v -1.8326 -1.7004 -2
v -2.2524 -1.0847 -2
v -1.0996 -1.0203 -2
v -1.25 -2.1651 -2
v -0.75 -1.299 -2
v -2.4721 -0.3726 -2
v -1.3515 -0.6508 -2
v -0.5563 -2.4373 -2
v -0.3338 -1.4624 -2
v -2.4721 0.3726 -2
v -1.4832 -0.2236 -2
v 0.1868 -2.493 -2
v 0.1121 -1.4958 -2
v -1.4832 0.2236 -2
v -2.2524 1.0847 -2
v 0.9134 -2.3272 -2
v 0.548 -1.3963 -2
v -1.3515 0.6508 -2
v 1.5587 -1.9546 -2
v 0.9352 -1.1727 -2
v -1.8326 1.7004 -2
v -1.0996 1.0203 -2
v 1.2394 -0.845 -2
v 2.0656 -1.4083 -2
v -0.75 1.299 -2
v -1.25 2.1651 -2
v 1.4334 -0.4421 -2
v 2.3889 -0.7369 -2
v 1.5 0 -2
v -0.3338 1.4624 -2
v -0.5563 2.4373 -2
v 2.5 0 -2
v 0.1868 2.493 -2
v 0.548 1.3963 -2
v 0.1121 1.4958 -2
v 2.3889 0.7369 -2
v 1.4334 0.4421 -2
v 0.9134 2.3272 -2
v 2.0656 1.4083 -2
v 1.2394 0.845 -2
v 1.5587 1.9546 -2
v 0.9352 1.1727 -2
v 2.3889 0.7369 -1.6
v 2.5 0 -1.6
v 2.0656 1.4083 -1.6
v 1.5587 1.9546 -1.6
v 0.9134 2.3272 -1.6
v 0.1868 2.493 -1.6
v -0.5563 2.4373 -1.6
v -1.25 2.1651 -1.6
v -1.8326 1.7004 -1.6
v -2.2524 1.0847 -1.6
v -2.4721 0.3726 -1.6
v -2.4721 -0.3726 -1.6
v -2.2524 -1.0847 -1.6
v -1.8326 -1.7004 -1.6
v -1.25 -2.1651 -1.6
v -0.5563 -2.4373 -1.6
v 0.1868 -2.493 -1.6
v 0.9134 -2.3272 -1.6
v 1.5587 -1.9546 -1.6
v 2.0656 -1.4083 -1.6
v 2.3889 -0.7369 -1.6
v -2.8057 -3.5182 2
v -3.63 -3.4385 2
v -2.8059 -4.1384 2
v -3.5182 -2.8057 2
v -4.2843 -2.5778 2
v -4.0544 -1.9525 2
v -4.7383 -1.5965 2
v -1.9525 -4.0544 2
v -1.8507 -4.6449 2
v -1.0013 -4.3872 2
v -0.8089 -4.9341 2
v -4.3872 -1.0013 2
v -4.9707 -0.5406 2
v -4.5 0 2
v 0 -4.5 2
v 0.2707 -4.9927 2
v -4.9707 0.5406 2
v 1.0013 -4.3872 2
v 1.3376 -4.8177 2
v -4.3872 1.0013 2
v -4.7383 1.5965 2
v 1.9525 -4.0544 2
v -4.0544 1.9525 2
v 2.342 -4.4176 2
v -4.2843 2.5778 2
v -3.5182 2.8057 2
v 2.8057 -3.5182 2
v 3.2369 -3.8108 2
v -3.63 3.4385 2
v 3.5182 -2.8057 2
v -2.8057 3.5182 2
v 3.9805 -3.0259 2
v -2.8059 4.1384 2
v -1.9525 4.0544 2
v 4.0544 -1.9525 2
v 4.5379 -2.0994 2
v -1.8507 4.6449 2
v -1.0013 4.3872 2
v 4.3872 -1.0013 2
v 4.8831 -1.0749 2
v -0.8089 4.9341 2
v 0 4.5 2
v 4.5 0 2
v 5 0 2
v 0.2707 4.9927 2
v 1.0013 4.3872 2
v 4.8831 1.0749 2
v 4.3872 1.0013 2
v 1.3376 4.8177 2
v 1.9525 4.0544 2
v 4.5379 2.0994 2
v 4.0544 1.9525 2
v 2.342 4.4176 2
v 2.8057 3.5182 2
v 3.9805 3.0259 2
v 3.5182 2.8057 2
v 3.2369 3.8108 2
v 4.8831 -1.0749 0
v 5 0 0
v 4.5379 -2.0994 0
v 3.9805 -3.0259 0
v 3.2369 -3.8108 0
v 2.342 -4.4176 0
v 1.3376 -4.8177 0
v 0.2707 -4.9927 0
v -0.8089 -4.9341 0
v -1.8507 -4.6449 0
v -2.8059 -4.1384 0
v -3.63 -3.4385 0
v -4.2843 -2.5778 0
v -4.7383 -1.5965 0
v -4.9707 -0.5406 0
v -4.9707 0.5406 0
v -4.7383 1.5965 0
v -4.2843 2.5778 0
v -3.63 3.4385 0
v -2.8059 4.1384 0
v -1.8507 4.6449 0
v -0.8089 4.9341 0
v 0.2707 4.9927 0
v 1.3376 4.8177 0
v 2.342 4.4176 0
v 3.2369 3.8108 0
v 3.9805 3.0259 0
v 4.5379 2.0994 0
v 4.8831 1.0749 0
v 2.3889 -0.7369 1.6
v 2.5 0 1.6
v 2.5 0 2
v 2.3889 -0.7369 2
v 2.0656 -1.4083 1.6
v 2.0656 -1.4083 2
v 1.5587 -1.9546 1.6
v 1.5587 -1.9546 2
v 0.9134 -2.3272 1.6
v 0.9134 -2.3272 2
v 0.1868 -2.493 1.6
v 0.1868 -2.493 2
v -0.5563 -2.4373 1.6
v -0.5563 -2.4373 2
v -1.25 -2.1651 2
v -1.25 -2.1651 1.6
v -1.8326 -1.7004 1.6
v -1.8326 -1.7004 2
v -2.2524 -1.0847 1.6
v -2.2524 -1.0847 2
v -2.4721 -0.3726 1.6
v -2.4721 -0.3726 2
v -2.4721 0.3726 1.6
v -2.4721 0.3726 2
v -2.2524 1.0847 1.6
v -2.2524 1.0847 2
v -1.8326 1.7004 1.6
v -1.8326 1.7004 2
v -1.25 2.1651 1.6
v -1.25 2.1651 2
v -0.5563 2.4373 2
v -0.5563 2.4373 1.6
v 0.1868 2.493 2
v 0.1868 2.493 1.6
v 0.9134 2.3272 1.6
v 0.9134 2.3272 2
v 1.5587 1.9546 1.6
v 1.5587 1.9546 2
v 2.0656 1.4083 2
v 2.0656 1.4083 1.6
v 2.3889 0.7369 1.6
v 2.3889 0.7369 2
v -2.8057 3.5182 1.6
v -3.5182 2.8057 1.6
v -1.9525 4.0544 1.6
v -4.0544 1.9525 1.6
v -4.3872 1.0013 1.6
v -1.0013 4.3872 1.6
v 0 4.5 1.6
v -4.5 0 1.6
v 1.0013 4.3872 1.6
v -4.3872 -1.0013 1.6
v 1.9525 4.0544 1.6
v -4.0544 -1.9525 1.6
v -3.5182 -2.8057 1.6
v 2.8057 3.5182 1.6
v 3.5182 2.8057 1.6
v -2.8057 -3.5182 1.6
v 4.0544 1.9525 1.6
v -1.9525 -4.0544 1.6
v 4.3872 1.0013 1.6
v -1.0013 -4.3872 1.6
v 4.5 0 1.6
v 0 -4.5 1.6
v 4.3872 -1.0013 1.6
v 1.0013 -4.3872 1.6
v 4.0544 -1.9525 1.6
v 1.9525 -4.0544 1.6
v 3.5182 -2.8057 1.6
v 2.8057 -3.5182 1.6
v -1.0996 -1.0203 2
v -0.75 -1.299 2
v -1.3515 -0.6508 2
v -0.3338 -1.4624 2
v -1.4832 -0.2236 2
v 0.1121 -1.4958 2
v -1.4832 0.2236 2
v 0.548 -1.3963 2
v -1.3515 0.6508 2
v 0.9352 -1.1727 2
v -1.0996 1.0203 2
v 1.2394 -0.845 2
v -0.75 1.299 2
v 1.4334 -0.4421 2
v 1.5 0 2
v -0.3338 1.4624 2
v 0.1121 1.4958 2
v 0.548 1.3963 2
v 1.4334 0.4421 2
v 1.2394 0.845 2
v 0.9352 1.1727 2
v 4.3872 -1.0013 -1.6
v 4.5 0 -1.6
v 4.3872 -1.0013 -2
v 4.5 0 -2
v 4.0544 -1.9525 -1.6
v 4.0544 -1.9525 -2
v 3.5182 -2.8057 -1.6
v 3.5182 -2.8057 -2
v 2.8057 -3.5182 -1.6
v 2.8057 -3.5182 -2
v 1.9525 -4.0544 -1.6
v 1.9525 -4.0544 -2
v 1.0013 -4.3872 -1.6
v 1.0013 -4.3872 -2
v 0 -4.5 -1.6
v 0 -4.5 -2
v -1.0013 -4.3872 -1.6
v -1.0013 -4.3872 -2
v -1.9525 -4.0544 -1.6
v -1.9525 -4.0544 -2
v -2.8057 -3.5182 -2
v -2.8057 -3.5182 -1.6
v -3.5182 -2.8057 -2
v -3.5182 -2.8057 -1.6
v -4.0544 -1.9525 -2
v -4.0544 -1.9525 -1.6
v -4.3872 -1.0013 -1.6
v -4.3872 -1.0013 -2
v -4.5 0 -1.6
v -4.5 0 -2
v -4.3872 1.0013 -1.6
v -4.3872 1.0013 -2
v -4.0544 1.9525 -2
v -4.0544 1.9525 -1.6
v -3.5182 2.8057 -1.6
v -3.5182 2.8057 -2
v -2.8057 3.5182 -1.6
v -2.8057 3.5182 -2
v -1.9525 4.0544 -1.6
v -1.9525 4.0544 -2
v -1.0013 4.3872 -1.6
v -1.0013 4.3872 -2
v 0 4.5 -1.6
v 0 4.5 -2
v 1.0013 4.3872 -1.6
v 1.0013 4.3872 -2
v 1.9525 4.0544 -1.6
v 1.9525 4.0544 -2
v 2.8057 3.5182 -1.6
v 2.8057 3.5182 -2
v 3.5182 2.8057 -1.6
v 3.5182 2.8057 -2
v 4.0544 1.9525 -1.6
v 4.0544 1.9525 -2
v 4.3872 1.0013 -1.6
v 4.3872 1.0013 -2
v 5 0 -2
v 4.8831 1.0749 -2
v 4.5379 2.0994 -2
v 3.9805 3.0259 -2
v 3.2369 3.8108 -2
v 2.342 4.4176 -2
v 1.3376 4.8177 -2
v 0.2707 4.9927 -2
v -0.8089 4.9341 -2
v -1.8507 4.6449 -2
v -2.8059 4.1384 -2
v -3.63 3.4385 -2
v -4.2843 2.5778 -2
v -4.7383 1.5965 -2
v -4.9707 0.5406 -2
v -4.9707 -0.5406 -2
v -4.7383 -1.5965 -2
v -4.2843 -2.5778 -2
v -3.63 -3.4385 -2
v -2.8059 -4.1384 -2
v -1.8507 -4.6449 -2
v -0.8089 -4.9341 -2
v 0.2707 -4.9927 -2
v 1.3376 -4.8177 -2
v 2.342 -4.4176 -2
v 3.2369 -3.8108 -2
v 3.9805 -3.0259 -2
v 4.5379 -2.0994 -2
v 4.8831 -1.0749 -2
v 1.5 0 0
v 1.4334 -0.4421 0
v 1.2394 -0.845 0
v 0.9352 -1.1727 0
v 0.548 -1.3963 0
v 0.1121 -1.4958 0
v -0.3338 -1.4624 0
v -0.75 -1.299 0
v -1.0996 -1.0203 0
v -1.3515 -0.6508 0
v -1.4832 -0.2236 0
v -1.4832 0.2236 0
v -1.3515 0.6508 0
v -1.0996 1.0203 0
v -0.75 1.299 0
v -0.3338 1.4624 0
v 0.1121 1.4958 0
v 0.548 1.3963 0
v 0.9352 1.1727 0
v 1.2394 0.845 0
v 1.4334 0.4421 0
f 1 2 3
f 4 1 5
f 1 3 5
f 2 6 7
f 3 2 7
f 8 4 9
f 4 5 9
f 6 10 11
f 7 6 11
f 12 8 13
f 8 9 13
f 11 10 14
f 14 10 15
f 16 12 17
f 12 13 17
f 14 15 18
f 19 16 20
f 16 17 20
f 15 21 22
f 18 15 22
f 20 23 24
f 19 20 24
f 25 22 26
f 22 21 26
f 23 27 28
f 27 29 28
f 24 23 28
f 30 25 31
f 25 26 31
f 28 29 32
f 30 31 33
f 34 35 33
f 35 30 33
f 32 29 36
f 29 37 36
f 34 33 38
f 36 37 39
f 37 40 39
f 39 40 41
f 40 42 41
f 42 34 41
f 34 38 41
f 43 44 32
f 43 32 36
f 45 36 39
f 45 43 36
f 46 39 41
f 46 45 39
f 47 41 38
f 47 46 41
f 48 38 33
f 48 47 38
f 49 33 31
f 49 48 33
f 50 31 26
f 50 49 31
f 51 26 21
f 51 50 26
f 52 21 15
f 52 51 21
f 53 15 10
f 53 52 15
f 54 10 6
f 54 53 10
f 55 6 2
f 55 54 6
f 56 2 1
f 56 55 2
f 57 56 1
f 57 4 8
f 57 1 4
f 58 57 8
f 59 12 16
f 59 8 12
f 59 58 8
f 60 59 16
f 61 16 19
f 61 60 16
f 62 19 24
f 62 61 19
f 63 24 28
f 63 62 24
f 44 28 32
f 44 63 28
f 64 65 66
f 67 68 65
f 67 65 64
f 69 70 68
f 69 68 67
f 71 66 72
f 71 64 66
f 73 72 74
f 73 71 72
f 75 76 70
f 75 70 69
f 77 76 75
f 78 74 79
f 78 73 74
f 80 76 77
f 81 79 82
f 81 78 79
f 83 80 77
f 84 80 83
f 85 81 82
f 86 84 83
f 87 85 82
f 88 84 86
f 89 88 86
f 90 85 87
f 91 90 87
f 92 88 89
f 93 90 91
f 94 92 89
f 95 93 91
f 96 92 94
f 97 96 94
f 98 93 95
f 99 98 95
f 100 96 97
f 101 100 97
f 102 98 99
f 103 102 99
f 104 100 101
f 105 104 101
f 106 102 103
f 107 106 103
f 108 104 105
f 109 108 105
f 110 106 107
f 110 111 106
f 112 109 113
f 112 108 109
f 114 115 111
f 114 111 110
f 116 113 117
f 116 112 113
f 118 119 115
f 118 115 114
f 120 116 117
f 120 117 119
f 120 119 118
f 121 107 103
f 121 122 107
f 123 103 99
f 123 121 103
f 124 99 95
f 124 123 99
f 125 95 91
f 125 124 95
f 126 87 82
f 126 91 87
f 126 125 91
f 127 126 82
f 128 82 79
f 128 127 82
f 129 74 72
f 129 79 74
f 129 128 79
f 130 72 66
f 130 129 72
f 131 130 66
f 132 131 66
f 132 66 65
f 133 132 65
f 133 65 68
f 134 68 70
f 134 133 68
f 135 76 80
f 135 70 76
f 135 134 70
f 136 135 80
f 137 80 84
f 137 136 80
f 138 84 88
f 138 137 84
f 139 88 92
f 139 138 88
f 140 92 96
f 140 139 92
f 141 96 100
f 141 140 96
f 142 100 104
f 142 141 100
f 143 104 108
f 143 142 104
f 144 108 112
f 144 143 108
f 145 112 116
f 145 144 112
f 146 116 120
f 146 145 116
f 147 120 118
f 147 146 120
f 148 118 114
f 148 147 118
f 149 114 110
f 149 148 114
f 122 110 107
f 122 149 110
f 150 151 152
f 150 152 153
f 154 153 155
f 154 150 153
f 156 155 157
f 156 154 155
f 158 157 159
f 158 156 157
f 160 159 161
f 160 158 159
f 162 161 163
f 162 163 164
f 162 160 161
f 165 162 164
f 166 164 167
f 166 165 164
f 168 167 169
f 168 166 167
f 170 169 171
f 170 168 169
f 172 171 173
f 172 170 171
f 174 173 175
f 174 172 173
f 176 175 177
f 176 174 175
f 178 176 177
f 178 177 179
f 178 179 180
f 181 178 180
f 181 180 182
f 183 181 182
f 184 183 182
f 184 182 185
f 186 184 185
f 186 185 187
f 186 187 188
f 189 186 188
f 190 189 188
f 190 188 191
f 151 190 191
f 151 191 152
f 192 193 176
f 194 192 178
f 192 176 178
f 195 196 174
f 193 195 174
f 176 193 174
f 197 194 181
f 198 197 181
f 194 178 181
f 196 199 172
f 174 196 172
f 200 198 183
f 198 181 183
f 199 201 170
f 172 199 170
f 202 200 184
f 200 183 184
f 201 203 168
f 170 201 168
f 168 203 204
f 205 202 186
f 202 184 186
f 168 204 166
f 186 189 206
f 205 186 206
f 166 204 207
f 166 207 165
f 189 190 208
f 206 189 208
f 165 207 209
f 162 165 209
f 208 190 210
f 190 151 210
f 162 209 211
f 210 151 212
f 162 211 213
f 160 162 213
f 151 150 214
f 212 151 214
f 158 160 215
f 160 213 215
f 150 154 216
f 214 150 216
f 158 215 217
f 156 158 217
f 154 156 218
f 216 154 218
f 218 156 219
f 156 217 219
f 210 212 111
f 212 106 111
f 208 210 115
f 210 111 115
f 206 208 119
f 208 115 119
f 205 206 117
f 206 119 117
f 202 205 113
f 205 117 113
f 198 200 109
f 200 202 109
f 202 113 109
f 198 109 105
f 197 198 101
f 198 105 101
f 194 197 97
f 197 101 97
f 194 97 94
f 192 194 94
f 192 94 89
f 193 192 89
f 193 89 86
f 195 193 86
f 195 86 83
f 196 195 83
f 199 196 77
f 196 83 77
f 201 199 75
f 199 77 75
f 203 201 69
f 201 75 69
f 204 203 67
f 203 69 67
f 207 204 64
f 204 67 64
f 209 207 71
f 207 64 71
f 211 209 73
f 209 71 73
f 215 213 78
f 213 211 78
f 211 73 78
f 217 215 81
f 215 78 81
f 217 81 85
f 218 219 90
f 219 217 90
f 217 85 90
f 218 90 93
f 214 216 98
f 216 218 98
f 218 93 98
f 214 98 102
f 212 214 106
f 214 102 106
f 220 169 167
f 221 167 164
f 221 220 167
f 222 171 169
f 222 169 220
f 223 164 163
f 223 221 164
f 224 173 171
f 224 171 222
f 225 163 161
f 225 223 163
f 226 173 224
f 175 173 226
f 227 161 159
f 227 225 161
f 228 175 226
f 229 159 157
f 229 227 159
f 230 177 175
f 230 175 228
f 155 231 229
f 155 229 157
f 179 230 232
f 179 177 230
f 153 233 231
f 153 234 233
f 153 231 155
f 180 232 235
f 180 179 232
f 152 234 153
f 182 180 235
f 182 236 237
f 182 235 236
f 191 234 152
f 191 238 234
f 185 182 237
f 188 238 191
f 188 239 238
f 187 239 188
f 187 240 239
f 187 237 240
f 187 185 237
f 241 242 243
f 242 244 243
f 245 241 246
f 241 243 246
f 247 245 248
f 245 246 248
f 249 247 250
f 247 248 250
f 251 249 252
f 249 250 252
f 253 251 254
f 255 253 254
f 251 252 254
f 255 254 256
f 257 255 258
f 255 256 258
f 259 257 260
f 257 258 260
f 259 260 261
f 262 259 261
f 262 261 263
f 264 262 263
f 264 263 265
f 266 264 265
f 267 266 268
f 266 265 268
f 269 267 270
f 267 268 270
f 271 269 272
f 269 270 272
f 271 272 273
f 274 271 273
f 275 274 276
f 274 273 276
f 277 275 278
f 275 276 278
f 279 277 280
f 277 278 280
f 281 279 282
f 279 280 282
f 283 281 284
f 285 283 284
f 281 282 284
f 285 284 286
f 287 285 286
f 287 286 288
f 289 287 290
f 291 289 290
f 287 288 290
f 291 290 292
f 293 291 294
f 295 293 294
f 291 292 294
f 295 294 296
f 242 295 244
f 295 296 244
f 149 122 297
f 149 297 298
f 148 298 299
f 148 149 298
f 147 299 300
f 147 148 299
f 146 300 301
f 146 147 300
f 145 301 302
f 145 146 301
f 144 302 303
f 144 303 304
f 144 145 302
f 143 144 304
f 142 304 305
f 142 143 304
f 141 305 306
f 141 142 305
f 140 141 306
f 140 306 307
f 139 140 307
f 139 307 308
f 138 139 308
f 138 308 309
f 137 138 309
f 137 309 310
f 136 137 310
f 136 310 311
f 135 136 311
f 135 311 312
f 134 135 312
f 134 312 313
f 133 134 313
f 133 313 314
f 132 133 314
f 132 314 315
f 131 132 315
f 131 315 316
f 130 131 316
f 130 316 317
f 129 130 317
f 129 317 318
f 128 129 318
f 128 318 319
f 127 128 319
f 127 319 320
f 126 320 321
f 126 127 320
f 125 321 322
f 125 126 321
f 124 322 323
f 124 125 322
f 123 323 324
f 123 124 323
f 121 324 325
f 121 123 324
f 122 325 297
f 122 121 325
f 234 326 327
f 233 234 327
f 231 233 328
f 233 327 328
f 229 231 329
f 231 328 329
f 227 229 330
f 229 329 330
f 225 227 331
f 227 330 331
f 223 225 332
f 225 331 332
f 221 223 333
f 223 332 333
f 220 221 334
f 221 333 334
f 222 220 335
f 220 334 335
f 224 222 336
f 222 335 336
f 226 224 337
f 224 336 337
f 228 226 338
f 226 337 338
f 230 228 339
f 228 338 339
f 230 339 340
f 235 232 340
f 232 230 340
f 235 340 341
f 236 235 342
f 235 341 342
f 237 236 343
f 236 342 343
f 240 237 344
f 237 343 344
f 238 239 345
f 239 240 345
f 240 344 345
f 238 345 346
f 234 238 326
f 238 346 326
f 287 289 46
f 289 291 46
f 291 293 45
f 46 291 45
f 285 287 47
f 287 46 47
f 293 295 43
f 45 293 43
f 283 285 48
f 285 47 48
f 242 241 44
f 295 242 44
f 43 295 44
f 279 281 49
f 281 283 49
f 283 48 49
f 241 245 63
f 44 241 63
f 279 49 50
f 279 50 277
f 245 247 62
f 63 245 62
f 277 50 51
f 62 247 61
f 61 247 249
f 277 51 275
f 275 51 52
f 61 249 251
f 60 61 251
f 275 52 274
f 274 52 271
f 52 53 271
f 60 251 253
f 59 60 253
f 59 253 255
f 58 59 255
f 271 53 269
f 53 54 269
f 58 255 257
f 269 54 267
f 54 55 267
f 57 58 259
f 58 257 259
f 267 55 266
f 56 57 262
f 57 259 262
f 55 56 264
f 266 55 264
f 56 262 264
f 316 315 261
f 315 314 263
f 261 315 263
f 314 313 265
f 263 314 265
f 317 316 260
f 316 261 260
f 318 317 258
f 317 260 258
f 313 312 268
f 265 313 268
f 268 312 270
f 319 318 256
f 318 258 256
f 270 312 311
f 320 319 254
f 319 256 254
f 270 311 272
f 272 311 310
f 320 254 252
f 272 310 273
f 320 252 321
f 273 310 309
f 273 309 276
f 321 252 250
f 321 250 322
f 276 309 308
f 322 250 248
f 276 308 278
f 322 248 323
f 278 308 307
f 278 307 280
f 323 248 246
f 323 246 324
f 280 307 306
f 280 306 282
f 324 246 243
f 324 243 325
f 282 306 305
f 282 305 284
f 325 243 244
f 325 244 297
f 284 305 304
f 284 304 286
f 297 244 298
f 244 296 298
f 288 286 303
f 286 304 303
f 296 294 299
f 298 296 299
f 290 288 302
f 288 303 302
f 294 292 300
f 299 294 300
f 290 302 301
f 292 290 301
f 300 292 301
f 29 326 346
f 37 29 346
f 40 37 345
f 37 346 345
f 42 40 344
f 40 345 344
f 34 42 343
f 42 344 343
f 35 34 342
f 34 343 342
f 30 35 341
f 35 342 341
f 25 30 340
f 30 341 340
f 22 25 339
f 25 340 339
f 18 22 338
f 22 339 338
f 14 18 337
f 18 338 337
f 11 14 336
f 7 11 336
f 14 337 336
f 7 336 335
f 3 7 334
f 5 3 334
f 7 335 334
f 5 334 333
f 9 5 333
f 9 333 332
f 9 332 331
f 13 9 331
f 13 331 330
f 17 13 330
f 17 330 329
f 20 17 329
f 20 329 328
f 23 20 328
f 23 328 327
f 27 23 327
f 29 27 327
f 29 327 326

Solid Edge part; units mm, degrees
sketch "Sketch1" plane through (0, 0, 0) normal (0, 0, 1) x (1, 0, 0)
  circle A0 centre (0, 0) radius 1.5
  circle A1 centre (0, 0) radius 5
  dimension "D1" = 10
extrude "Protrusion1" add sketch "Sketch1" along normal mid plane 4
sketch "Sketch2" plane through (0, 0, 0) normal (0, -1, 0) x (1, 0, 0)
  line L0 (0, 2) -> (2.5, 2)
  line L1 (2.5, 2) -> (2.5, 1.6)
  line L2 (2.5, 1.6) -> (4.5, 1.6)
  line L3 (4.5, 1.6) -> (4.5, 2)
  line L4 (4.5, 2) -> (5.6166, 2)
  dimension "D1" = 0.4
  dimension "D2" = 0.4
revolve "RevolvedCutout1" cut sketch "Sketch2" angle 360 about axis through (0, 0, 54) along (0, 0, -1) material side at (1.25, 0, 2.05)
mirror "Mirror1" about plane through (0, 0, 0) normal (0, 0, 1) of "RevolvedCutout1"
properties material "Stainless steel"
